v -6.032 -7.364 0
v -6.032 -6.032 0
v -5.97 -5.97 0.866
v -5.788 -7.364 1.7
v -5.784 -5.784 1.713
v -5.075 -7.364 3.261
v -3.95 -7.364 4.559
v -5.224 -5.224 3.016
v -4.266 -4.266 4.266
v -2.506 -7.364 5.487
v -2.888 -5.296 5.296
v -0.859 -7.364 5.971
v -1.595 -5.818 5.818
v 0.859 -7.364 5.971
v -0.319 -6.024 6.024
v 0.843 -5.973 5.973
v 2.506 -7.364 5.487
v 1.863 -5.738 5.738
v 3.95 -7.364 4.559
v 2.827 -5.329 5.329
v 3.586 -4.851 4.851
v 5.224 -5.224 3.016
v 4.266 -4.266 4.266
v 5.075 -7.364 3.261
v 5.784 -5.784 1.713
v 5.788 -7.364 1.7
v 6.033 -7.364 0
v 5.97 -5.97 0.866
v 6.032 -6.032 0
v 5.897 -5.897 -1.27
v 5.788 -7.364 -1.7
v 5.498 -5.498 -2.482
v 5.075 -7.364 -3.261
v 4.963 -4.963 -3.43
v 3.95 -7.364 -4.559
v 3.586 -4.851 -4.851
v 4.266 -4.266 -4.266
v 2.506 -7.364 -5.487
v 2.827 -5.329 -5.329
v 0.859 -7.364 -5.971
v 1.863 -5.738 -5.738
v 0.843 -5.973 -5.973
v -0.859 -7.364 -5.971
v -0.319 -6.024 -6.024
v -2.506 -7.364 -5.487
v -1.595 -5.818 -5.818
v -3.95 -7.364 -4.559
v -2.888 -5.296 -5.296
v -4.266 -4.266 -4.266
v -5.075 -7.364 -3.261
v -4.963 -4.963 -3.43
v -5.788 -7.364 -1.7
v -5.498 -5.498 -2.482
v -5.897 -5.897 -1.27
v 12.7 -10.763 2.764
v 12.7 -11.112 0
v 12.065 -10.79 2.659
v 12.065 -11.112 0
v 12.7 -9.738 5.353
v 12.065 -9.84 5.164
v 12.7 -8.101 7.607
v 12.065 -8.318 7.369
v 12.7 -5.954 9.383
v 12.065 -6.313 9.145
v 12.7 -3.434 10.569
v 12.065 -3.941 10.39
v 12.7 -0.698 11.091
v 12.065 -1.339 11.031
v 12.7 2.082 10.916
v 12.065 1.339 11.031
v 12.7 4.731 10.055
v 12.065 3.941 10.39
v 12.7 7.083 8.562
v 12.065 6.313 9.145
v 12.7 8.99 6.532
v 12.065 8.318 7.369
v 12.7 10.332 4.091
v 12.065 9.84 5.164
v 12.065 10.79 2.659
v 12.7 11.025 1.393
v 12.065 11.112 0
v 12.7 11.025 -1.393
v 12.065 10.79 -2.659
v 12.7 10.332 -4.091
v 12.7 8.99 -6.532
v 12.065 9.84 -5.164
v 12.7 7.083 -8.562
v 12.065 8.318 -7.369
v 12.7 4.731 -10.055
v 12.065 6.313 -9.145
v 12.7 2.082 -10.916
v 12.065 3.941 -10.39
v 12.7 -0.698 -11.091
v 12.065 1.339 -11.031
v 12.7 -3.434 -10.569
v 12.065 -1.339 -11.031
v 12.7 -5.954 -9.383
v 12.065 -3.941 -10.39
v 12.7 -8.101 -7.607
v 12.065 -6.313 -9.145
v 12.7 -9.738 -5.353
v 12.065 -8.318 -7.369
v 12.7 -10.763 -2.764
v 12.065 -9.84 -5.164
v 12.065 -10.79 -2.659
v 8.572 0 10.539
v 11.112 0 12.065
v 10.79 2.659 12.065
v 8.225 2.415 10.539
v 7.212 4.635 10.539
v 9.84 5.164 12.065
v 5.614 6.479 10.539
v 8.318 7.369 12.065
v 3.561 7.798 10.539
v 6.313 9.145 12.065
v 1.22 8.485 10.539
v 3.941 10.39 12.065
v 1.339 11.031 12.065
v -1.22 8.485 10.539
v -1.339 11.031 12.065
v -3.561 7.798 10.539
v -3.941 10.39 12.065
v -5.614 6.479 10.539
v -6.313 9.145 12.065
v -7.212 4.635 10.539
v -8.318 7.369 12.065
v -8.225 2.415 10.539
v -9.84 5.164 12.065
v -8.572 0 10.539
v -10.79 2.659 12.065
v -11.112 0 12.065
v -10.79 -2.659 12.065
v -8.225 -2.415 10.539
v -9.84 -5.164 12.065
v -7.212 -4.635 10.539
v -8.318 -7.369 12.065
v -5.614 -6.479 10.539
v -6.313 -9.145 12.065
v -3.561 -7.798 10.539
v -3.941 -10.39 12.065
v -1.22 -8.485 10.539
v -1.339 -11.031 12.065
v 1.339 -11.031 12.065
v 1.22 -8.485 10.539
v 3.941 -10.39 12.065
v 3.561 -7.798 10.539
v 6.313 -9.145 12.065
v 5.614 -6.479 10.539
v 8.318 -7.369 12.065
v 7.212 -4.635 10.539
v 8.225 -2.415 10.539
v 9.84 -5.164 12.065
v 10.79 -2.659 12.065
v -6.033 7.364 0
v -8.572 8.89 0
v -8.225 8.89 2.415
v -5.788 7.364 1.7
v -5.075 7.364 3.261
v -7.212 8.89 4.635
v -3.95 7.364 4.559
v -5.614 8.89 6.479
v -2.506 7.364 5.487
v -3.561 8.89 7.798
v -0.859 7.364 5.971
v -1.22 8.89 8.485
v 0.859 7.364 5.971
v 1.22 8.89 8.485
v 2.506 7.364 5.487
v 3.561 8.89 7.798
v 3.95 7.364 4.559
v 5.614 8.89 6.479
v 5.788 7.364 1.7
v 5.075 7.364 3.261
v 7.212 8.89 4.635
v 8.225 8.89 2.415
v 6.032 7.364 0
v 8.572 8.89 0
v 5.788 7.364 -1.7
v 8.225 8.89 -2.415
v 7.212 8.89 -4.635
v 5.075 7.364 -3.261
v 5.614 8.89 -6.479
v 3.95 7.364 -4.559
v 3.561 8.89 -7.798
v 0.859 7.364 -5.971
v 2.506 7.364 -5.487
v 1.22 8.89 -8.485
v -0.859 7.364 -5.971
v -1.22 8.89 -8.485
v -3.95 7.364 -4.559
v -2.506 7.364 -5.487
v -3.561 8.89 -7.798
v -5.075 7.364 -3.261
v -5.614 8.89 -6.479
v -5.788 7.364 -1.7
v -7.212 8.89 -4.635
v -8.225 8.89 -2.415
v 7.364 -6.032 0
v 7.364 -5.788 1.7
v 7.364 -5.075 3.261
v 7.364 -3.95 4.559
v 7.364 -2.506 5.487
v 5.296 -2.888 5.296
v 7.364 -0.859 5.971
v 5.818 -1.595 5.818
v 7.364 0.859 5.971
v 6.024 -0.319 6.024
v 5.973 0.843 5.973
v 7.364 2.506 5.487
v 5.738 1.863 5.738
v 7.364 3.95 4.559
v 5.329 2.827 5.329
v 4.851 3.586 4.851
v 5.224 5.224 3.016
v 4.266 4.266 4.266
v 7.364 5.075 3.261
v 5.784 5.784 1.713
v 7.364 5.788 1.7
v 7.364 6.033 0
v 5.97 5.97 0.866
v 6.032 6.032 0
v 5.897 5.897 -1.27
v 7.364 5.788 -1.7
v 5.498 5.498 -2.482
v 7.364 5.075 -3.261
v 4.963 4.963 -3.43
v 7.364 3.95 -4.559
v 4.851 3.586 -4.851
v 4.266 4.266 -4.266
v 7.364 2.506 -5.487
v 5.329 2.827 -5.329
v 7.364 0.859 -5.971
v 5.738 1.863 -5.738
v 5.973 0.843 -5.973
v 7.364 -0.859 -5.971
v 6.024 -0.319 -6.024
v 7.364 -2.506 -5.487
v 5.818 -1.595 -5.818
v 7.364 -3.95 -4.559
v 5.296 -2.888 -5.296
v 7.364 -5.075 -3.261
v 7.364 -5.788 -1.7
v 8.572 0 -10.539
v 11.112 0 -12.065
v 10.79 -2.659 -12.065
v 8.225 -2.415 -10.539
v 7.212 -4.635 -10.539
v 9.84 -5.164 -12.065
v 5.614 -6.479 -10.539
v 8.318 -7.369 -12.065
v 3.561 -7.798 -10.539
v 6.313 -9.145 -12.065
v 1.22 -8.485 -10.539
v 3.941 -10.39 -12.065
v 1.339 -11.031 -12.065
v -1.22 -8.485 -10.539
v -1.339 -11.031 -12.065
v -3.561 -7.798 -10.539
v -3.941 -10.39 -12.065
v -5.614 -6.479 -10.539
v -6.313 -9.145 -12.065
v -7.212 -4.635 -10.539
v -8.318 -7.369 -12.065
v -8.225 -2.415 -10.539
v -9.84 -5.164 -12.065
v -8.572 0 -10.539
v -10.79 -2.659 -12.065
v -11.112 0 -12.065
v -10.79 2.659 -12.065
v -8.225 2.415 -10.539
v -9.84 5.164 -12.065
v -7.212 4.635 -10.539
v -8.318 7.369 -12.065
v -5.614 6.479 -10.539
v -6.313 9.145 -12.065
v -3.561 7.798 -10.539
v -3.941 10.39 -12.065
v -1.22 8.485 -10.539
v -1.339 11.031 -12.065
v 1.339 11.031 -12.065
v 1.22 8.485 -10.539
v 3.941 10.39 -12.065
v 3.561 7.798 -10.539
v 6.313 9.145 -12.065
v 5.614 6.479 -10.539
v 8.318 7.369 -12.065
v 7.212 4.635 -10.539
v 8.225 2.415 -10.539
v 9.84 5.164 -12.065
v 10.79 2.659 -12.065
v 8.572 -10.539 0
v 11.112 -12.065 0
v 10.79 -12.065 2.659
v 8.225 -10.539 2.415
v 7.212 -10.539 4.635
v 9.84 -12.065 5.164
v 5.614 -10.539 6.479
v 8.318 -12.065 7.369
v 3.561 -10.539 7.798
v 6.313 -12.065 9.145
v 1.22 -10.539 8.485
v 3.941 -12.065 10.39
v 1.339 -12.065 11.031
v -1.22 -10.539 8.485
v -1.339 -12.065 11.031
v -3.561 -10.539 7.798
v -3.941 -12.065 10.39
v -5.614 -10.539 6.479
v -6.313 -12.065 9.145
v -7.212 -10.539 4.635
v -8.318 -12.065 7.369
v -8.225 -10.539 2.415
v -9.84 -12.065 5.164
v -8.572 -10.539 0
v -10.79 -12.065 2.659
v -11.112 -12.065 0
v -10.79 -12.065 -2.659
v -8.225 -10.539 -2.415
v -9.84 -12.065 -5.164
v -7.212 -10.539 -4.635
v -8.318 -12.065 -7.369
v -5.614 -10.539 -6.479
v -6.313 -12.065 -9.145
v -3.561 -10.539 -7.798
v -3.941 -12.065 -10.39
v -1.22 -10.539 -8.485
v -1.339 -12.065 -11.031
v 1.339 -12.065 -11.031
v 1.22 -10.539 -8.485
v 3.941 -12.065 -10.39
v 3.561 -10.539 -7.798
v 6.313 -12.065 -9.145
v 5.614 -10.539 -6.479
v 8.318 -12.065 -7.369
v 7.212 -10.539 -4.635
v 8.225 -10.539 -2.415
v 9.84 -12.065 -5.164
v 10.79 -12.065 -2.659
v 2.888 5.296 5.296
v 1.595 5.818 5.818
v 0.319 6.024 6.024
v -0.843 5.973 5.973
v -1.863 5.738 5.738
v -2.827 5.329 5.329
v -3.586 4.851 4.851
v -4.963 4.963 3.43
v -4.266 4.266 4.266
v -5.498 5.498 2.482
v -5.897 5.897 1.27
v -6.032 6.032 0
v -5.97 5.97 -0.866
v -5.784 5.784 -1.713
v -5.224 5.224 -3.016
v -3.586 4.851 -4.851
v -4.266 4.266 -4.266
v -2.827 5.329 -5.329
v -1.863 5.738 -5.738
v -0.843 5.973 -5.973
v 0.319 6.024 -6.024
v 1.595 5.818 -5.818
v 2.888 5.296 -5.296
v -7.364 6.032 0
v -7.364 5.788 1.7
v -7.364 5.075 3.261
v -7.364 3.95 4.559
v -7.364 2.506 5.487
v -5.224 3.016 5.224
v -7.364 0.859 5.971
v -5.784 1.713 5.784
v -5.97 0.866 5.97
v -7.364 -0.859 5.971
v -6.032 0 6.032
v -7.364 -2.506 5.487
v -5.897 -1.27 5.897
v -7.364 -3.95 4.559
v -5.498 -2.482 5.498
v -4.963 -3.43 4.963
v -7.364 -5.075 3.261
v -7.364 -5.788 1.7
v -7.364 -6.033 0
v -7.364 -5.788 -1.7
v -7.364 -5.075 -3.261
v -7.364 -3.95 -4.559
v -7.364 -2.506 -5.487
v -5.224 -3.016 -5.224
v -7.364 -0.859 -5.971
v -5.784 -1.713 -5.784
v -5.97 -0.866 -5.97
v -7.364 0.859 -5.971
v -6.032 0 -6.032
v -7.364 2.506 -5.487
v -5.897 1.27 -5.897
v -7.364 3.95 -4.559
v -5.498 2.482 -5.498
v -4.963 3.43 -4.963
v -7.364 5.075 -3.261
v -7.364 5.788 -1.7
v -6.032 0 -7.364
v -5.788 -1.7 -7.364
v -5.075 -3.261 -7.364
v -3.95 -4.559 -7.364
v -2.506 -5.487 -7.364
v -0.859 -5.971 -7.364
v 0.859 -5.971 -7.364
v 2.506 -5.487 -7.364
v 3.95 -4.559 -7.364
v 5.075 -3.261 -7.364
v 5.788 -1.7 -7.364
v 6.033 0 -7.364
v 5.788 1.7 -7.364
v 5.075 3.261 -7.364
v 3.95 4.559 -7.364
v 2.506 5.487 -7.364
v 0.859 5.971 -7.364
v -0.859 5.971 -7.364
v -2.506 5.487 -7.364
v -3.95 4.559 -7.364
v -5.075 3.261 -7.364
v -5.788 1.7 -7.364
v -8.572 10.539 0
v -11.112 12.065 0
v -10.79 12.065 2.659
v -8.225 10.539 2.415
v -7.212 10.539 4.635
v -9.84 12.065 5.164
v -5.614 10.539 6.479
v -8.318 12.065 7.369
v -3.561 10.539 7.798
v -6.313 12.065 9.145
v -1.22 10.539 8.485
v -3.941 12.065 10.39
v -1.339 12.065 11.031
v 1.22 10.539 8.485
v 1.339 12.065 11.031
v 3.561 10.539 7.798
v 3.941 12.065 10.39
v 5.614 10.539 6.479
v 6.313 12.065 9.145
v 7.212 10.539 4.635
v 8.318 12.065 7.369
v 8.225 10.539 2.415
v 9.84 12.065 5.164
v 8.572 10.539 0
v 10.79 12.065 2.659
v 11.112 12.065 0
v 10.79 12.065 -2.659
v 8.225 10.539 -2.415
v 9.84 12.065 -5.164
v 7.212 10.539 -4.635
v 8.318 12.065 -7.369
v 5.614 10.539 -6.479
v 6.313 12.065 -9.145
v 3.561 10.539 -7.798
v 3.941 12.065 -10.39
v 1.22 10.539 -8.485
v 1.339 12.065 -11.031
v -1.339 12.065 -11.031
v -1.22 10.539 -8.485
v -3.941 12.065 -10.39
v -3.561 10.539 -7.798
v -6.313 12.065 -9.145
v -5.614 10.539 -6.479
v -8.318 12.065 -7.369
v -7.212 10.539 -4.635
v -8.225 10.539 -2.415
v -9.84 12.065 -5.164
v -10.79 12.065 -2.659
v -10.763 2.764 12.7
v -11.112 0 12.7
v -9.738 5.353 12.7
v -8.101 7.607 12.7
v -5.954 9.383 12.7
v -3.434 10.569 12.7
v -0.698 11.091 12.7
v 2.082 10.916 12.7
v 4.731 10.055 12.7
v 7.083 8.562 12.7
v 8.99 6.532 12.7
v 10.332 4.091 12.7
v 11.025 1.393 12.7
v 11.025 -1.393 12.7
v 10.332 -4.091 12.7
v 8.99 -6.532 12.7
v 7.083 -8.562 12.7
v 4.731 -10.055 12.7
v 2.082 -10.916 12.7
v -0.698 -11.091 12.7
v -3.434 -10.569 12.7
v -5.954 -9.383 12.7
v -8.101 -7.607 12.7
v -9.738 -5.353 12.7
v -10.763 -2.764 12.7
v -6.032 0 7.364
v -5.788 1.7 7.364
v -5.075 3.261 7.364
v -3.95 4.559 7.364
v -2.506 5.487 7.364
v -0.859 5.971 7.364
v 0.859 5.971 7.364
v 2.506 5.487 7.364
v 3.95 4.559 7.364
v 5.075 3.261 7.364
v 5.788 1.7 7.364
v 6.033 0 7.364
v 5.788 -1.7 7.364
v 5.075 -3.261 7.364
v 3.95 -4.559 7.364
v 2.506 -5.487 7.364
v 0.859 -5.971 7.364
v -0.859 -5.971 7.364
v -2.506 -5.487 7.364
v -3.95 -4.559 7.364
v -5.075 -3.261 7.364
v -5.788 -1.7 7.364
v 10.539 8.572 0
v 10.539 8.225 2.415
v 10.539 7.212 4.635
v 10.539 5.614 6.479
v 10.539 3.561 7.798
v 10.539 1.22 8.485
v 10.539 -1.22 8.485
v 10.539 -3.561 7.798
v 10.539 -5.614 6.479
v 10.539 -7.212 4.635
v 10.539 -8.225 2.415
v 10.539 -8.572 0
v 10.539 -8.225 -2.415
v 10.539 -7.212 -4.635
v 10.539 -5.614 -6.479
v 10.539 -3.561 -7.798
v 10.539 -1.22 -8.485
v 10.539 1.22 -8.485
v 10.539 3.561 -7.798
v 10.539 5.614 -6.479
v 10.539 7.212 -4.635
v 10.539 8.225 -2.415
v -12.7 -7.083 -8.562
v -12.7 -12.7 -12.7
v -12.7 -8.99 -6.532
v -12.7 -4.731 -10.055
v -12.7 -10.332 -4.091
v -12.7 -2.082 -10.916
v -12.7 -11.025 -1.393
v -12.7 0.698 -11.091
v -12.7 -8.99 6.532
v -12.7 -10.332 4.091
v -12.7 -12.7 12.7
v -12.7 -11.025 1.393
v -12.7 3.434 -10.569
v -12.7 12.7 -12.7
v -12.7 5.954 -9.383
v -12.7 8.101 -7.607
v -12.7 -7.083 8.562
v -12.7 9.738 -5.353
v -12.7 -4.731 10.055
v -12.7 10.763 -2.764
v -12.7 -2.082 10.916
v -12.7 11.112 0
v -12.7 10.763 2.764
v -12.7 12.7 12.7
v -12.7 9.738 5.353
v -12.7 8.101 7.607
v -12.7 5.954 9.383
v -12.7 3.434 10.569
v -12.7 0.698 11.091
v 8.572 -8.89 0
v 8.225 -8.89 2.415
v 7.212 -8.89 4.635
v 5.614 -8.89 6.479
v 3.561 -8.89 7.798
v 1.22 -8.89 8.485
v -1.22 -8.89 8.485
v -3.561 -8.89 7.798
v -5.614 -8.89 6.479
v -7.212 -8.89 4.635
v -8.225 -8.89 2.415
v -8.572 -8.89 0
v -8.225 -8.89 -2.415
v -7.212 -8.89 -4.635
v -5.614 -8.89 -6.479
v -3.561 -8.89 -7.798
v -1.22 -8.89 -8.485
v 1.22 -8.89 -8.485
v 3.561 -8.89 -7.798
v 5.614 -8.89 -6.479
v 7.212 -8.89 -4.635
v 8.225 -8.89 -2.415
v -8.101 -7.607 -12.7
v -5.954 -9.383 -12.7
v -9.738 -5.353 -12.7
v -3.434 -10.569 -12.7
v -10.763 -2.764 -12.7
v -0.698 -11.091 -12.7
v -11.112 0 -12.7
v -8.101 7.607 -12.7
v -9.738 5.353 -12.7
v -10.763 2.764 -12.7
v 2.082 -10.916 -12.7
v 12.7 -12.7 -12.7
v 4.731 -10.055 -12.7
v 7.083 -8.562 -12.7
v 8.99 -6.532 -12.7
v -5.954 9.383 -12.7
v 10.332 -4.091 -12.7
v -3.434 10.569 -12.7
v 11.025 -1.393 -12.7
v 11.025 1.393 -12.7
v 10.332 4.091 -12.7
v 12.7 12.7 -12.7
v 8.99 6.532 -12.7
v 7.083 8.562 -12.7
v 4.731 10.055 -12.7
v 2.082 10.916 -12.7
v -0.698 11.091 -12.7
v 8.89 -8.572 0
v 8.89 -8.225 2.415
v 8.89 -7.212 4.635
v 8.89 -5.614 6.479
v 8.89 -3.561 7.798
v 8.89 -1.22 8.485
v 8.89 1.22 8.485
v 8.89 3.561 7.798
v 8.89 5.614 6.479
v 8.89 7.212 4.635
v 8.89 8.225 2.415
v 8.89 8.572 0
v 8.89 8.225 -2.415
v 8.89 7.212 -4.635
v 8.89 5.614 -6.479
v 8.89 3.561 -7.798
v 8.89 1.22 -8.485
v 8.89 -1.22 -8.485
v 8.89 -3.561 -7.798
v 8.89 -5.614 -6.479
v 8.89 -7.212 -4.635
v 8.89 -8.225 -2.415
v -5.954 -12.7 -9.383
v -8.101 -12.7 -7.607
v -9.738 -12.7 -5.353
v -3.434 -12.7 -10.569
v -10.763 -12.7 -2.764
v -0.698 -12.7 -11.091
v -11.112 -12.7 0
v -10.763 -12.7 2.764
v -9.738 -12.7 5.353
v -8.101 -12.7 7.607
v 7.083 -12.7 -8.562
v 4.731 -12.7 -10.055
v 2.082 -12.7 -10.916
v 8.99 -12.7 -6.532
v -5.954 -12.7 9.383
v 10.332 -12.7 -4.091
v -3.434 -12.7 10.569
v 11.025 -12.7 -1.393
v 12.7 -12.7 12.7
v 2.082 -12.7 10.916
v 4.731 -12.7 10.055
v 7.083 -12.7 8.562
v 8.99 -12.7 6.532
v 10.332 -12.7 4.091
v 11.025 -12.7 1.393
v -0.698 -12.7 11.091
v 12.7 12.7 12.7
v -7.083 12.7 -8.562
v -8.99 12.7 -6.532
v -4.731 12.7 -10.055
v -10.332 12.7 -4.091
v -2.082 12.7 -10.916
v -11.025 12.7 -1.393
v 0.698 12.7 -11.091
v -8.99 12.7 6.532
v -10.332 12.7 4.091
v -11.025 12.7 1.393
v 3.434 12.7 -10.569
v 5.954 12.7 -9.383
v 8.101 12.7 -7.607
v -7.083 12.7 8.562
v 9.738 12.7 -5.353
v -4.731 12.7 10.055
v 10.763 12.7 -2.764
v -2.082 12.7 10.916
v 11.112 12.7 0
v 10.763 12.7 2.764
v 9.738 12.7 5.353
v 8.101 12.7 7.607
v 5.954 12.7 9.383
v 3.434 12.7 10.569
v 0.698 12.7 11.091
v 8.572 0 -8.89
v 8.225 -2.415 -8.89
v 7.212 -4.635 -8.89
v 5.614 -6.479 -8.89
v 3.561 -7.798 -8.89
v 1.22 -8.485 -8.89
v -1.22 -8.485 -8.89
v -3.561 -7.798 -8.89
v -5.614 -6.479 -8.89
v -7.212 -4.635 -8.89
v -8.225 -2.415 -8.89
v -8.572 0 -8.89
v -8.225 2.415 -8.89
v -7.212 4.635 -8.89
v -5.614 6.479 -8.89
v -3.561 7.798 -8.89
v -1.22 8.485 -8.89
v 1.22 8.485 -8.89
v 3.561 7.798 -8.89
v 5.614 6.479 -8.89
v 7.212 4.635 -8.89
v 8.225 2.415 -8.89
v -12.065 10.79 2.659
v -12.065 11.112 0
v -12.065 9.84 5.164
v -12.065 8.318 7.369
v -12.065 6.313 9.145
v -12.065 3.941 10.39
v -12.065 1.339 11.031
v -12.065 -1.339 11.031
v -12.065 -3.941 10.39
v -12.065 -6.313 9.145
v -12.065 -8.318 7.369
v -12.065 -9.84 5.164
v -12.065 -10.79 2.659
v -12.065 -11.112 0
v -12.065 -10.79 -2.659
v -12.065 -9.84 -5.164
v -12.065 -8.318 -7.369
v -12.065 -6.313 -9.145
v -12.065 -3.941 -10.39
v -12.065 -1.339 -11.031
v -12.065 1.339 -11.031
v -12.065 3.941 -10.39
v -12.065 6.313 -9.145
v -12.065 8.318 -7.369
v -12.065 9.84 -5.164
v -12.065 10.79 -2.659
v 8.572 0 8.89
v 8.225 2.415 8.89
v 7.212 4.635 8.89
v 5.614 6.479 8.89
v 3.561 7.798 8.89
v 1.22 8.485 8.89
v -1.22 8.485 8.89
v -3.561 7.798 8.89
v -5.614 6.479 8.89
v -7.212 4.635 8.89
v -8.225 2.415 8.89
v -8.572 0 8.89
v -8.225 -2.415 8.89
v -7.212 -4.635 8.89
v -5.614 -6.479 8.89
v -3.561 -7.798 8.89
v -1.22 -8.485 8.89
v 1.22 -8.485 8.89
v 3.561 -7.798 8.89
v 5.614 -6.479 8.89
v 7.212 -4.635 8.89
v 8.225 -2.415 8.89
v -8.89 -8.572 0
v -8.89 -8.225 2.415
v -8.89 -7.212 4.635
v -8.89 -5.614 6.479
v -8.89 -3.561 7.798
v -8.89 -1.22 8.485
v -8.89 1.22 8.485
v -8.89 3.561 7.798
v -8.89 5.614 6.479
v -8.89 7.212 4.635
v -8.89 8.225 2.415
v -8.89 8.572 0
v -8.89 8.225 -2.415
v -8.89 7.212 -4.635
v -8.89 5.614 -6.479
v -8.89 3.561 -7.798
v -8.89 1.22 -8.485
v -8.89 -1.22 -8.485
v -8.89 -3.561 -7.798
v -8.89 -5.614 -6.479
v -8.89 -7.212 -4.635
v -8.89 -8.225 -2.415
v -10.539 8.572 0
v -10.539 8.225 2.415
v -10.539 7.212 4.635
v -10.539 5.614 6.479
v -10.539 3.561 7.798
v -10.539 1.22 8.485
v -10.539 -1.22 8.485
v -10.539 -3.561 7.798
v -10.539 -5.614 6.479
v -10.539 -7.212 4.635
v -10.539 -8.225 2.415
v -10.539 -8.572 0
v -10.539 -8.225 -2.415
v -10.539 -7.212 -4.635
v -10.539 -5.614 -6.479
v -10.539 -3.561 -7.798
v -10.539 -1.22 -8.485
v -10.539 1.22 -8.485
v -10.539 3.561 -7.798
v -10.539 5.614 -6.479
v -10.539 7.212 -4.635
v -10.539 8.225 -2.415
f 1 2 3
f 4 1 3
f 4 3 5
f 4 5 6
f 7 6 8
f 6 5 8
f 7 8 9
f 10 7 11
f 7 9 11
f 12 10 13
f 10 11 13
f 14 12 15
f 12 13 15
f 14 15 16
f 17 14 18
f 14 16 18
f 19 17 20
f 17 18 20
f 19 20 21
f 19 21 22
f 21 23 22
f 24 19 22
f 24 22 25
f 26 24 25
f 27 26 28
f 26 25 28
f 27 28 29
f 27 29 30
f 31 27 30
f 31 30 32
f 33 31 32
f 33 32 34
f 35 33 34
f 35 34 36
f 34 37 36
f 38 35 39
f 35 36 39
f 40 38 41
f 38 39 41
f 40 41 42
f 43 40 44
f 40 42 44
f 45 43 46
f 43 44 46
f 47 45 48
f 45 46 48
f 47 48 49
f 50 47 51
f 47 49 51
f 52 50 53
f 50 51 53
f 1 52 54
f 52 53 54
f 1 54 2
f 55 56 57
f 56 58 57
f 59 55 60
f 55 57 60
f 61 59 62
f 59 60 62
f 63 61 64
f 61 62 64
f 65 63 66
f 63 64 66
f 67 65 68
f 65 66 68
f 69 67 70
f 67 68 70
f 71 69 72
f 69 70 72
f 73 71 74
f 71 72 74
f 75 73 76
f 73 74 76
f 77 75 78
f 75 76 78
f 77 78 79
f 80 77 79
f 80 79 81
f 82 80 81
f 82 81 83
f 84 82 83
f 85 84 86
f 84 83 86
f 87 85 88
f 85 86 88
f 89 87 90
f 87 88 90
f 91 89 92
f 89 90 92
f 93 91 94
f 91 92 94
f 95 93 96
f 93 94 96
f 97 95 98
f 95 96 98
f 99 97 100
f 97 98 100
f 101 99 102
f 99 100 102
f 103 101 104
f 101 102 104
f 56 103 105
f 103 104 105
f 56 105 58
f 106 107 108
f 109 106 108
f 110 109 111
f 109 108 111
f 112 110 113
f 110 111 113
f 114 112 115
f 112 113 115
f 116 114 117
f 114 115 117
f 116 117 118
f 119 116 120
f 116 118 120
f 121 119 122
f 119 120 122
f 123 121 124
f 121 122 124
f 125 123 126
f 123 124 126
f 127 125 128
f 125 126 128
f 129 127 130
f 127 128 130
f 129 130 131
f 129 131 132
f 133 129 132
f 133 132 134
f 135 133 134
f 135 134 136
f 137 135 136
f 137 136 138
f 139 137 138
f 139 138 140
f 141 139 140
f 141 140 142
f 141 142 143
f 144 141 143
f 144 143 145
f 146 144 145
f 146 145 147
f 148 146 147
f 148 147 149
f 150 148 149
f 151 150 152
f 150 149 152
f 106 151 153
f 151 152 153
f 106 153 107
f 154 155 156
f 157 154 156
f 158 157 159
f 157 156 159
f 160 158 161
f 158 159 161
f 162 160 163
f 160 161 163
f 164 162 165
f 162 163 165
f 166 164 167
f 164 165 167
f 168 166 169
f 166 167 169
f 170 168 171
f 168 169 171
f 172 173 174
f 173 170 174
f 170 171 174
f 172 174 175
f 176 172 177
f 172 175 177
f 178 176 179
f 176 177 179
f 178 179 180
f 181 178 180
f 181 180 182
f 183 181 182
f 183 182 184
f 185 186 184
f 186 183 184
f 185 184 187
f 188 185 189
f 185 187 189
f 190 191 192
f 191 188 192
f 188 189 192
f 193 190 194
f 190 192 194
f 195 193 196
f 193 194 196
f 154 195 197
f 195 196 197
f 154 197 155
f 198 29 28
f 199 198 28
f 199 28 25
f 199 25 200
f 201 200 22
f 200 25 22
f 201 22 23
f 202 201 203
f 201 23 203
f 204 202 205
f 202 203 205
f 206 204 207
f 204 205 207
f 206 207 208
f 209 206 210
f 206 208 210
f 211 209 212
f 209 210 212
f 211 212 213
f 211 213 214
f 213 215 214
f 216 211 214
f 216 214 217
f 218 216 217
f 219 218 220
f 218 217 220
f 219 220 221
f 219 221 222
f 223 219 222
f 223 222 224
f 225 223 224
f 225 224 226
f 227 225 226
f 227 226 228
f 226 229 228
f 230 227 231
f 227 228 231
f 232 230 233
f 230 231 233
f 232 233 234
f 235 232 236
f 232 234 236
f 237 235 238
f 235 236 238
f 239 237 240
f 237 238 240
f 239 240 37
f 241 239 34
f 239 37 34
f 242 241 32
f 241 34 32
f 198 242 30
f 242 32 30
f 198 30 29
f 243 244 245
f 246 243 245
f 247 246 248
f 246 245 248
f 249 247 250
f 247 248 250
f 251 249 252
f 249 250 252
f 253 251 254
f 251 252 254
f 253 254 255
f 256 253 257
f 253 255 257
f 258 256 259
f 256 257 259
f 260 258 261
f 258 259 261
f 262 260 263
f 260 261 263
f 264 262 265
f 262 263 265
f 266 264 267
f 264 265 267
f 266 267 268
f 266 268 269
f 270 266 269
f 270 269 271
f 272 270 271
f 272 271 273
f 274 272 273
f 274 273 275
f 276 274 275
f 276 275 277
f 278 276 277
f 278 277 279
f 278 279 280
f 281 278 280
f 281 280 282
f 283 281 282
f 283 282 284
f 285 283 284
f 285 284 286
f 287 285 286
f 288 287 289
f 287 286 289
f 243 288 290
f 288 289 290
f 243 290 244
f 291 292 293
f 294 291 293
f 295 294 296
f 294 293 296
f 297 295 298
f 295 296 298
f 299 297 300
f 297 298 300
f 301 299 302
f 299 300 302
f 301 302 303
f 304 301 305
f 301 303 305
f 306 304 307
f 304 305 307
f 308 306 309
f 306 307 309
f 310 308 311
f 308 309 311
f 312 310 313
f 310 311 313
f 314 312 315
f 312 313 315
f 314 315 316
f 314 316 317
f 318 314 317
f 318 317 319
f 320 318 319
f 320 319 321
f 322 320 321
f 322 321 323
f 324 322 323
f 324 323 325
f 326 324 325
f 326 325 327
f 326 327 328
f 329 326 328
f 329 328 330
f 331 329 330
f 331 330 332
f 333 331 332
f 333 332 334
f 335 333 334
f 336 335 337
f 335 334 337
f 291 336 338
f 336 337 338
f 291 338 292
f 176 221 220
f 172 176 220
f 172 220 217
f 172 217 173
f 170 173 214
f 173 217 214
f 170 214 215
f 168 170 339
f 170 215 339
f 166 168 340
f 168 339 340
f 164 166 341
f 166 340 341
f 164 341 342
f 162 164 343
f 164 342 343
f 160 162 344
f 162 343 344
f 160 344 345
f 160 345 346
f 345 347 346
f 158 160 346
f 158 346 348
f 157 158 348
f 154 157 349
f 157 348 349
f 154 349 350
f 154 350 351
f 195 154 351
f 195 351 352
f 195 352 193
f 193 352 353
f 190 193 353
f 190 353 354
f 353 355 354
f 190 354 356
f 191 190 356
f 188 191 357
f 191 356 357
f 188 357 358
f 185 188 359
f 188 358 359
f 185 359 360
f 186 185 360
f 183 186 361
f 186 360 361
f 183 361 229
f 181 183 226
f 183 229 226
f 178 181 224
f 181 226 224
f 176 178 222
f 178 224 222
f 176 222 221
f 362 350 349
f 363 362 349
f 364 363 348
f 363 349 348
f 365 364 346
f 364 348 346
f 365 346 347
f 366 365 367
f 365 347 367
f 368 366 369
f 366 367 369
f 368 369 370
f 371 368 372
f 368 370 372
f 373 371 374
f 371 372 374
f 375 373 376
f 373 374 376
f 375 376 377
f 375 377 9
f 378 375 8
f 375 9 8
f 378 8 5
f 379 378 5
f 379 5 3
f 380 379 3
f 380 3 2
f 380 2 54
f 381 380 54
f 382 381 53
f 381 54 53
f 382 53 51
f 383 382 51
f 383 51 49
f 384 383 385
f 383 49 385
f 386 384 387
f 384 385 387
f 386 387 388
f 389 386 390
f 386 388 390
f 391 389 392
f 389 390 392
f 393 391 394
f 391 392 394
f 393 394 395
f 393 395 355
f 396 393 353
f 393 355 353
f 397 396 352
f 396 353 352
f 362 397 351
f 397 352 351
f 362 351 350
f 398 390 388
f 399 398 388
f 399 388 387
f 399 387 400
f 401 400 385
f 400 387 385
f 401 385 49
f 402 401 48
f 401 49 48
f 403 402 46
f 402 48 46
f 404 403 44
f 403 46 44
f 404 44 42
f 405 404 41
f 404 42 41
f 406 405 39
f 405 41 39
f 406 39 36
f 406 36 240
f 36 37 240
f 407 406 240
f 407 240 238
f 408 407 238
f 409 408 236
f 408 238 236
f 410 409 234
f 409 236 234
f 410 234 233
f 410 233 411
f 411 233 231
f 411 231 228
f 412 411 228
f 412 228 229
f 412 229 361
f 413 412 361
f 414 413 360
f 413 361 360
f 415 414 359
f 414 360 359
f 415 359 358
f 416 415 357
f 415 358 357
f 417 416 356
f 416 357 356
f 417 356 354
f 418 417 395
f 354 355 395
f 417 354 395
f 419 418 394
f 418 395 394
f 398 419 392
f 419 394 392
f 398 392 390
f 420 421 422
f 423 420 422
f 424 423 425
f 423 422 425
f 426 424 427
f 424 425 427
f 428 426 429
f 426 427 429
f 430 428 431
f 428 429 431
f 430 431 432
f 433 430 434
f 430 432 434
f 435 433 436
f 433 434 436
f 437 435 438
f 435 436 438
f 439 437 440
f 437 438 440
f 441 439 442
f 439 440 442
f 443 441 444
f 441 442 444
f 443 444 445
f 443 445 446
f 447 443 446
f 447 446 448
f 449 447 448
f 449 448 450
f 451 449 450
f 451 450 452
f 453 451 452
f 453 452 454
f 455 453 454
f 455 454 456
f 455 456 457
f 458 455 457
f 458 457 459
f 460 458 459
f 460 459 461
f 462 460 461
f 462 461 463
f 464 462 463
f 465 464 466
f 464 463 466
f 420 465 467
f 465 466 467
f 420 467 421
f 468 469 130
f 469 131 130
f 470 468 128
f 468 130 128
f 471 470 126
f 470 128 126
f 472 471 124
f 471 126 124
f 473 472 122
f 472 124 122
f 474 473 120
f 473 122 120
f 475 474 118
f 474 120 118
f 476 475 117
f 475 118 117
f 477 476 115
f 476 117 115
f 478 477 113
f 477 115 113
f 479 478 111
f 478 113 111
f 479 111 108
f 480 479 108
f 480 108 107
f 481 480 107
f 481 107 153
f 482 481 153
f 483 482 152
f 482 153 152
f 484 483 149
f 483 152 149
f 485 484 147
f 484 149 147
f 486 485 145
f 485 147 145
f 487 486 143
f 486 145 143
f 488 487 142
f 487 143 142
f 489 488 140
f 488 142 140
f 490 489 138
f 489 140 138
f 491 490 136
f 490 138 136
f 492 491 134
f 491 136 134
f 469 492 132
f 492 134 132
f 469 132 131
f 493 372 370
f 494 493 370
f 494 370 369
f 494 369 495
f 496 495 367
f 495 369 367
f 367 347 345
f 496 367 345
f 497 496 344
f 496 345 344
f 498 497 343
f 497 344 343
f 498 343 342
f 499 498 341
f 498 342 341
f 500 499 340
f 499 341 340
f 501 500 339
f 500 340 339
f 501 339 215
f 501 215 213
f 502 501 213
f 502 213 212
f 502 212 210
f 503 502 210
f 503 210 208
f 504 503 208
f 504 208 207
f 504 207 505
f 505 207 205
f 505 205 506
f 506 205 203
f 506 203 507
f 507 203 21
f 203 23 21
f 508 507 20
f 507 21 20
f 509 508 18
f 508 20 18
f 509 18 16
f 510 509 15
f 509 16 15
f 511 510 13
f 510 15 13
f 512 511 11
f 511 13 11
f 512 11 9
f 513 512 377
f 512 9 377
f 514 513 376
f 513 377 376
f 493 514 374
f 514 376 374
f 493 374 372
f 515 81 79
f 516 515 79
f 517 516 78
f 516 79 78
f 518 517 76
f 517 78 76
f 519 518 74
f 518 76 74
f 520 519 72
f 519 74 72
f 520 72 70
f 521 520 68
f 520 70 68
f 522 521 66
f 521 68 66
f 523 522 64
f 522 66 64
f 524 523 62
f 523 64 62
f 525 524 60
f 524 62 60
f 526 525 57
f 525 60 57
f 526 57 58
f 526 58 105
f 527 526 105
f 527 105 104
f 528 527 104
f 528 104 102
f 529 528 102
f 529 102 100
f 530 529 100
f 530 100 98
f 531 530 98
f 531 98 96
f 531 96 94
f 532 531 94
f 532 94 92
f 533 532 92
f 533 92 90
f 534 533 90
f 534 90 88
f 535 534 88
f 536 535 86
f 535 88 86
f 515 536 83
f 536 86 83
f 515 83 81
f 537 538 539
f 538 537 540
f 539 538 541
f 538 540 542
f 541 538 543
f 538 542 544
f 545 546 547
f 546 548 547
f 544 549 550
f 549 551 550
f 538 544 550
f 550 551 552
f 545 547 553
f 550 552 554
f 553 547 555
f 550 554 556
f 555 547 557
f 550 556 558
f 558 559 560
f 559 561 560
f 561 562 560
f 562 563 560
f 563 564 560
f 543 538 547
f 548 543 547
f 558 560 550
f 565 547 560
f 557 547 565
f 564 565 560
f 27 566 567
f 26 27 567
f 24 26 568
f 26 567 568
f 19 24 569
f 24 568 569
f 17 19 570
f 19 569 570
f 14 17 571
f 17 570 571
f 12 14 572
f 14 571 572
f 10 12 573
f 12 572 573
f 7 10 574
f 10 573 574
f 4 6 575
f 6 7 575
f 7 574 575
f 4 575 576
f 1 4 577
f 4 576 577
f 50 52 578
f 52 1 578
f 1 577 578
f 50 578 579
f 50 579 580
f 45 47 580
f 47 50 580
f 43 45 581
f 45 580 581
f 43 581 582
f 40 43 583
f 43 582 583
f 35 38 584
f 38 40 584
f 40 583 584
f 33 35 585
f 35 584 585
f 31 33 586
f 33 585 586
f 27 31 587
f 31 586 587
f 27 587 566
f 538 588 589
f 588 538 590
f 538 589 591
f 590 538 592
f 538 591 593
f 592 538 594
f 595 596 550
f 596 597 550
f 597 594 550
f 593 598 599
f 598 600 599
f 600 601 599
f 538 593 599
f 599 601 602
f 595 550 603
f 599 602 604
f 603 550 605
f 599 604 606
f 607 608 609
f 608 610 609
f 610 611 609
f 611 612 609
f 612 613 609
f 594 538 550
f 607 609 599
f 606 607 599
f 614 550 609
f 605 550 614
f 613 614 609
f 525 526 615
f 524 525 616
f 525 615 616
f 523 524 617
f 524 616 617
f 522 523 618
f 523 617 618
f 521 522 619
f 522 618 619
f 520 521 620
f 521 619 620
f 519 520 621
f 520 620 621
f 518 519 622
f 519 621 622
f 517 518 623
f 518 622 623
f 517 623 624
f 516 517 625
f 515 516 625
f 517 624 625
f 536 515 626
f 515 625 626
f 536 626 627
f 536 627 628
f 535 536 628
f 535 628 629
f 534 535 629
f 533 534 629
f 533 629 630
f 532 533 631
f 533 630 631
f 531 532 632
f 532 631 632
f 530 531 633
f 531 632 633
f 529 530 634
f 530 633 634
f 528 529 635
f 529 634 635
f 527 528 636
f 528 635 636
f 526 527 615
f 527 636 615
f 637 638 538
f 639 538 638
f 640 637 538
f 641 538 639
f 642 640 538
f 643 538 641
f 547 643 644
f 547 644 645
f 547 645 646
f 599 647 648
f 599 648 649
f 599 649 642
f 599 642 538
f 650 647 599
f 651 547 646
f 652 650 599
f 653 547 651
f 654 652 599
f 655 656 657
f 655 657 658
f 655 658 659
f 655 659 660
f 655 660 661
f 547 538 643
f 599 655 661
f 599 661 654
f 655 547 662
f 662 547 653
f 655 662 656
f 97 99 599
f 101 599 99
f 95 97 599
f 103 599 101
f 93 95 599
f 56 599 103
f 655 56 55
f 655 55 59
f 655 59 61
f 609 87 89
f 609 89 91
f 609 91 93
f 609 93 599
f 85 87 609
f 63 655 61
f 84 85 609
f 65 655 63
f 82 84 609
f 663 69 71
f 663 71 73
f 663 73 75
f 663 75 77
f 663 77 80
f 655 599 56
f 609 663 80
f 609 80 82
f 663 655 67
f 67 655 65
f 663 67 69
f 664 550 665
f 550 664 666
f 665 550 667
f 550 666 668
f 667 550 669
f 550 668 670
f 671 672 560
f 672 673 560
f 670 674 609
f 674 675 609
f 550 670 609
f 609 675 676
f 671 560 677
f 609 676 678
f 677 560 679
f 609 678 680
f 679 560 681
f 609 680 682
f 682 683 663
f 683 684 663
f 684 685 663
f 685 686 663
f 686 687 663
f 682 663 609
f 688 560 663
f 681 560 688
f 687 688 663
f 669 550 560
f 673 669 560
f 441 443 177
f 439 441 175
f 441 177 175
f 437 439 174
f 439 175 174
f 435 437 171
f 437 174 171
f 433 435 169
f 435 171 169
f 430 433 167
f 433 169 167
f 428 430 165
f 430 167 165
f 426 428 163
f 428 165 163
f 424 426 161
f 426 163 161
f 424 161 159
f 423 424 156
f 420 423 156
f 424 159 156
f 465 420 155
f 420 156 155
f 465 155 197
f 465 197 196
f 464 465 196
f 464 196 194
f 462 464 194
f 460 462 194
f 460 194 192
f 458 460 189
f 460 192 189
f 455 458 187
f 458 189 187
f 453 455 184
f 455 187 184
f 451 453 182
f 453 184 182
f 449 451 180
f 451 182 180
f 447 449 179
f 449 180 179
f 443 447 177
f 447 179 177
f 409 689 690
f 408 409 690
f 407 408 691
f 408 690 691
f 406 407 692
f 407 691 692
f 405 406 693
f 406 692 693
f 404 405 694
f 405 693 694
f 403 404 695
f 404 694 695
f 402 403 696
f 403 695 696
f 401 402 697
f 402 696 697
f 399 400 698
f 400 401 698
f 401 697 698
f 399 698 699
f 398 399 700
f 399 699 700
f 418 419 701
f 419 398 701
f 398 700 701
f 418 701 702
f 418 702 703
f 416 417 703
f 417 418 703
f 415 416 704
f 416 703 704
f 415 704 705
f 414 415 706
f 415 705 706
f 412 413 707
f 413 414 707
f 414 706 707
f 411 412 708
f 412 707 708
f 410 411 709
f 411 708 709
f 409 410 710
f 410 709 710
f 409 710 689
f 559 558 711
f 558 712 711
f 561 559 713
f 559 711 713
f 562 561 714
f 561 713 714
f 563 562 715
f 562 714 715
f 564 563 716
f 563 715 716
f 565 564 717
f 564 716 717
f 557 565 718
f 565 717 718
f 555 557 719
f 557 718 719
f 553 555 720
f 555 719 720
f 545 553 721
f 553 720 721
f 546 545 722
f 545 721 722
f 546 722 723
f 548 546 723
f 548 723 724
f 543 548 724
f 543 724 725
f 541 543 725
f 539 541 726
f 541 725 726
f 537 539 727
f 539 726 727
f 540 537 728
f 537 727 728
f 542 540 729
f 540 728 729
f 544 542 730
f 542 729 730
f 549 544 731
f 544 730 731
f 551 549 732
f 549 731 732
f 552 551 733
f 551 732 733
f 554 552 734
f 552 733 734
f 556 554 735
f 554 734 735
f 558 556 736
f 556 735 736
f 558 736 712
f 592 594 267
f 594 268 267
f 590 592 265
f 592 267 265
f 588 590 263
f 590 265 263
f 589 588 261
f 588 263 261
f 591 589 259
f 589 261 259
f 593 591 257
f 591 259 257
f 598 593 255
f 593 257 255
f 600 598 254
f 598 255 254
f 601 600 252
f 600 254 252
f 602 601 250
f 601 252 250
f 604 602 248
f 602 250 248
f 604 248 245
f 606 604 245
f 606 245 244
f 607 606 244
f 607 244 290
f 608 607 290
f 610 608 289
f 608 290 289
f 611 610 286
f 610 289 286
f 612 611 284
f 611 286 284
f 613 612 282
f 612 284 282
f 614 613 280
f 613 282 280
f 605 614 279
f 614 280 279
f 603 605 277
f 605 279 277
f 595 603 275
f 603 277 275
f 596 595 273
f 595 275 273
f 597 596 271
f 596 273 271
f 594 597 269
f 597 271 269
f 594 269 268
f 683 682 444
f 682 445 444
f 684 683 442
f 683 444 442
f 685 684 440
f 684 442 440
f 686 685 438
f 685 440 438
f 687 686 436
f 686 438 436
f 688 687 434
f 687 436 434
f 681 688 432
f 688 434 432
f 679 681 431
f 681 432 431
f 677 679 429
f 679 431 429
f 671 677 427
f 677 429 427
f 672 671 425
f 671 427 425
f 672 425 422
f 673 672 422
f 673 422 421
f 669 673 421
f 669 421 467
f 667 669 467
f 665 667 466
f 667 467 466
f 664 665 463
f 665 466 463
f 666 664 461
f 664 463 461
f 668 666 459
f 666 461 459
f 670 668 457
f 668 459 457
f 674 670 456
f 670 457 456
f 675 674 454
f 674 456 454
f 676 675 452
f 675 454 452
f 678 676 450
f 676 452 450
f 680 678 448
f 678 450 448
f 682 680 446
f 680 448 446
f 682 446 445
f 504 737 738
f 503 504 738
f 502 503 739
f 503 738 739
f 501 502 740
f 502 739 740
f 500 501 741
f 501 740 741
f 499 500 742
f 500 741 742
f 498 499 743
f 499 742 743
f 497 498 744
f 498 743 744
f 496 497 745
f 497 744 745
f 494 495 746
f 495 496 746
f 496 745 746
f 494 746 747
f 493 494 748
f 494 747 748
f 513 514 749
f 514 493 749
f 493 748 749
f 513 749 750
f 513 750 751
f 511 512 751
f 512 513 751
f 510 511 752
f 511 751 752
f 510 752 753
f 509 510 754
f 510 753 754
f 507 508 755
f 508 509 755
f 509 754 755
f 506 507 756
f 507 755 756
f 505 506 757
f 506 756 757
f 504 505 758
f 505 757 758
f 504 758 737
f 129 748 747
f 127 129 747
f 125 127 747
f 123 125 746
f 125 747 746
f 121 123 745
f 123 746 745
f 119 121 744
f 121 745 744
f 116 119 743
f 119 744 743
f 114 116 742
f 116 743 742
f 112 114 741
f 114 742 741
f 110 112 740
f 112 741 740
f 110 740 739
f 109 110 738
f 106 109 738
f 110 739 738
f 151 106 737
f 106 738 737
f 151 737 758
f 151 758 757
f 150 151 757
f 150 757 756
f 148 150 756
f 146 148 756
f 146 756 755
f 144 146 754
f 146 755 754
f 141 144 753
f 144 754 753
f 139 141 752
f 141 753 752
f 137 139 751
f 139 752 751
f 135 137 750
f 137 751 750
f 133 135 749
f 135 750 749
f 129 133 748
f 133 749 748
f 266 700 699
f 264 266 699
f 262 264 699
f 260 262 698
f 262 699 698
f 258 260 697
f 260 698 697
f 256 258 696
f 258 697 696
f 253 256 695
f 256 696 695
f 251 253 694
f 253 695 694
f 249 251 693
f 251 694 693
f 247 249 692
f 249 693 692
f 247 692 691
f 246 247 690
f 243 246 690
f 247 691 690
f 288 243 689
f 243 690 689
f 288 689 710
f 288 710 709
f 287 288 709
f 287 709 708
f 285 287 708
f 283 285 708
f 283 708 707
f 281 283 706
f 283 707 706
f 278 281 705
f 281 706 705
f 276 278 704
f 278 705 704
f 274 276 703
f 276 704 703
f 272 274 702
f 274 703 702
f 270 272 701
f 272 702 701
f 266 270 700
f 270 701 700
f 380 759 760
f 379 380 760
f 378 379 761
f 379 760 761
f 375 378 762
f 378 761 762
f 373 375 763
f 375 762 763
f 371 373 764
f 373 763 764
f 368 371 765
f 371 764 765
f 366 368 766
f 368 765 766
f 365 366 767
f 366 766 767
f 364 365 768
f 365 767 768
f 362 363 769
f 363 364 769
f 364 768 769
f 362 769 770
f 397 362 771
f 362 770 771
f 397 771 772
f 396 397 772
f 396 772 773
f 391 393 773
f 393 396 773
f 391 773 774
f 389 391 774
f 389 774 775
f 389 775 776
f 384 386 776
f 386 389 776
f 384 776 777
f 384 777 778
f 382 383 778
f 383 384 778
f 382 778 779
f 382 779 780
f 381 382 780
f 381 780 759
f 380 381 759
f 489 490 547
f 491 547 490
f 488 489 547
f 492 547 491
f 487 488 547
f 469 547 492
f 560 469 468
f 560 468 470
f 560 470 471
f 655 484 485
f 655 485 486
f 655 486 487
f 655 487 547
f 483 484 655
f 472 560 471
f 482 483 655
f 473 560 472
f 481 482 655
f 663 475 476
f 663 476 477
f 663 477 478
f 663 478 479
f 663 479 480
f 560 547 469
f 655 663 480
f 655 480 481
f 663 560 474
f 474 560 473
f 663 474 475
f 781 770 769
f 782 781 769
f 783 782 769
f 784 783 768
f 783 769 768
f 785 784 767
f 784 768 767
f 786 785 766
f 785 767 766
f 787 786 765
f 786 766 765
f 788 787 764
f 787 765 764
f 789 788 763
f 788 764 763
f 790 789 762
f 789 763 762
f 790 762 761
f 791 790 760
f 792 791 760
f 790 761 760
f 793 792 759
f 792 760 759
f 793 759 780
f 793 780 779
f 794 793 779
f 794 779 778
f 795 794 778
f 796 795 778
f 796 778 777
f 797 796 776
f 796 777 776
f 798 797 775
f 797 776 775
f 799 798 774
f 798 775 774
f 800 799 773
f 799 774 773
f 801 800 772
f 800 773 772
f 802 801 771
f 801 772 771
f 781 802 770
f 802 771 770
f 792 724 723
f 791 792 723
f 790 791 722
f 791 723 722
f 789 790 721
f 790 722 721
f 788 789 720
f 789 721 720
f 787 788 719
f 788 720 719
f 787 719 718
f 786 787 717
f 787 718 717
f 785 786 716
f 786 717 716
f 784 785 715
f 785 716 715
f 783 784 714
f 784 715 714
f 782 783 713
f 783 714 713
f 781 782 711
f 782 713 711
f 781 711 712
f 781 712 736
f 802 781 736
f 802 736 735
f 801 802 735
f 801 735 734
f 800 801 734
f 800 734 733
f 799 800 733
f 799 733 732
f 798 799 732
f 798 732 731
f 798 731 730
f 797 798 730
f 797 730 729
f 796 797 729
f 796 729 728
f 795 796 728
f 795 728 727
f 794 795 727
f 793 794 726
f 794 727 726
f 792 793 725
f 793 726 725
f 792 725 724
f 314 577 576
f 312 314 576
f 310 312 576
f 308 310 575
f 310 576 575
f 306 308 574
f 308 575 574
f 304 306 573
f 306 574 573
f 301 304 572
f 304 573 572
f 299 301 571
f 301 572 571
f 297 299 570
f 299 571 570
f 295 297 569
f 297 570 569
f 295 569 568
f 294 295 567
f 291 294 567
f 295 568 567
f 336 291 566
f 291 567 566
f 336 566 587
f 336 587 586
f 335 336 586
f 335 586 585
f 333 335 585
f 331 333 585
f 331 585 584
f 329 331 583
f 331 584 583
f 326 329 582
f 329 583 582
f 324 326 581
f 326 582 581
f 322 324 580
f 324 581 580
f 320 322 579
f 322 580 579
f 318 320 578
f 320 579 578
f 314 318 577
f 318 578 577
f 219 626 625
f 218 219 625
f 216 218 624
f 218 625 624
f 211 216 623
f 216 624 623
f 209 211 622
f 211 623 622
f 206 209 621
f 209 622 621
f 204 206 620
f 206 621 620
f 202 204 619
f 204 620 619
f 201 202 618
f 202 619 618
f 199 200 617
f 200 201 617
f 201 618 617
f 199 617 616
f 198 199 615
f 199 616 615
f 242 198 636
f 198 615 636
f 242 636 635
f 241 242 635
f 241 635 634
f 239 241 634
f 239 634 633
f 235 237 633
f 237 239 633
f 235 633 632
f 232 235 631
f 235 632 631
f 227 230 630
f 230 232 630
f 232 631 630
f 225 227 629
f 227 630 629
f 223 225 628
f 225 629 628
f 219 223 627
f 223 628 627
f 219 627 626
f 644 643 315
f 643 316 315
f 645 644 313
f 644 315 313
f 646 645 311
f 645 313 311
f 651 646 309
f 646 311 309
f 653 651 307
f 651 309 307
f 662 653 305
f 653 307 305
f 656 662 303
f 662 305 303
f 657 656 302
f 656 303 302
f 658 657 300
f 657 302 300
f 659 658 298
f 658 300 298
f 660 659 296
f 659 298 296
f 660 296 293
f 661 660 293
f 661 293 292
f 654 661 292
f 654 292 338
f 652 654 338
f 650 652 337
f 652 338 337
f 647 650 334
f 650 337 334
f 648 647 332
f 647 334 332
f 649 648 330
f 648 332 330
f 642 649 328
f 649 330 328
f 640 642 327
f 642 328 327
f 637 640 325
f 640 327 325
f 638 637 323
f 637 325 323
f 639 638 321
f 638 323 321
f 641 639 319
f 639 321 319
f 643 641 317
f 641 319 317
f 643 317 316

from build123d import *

# Parameters (mm, degrees)
F0_W             = 25.4
F0_H             = 25.4
F1_DEPTH         = 12.7
F3_D             = 3.175
F5_D             = 3.175
F7_D             = 3.175
F11_D            = 17.145
F11_DEPTH        = 3.81
F11_TIP          = 5.1508776566
F11_ON_F6_D      = 17.145
F11_ON_F6_DEPTH  = 3.81
F11_ON_F6_TIP    = 5.1508776566
F11_ON_F10_D     = 17.145
F11_ON_F10_DEPTH = 3.81
F11_ON_F10_TIP   = 5.1508776566
F11_ON_F4_D      = 17.145
F11_ON_F4_DEPTH  = 3.81
F11_ON_F4_TIP    = 5.1508776566
F11_ON_F9_D      = 17.145
F11_ON_F9_DEPTH  = 3.81
F11_ON_F9_TIP    = 5.1508776566
F11_ON_F2_D      = 17.145
F11_ON_F2_DEPTH  = 3.81
F11_ON_F2_TIP    = 5.1508776566
F12_D            = 22.225
F12_DEPTH        = 0.635
F12_TIP          = 6.6770636289
F12_ON_F2_D      = 22.225
F12_ON_F2_DEPTH  = 0.635
F12_ON_F2_TIP    = 6.6770636289
F12_ON_F10_D     = 22.225
F12_ON_F10_DEPTH = 0.635
F12_ON_F10_TIP   = 6.6770636289
F12_ON_F8_D      = 22.225
F12_ON_F8_DEPTH  = 0.635
F12_ON_F8_TIP    = 6.6770636289
F12_ON_F4_D      = 22.225
F12_ON_F4_DEPTH  = 0.635
F12_ON_F4_TIP    = 6.6770636289
F12_ON_F6_D      = 22.225
F12_ON_F6_DEPTH  = 0.635
F12_ON_F6_TIP    = 6.6770636289
F13_D            = 12.065
F13_DEPTH        = 3.81
F13_START        = 5.336186
F13_TIP          = 3.6246916843
F13_ON_F8_D      = 12.065
F13_ON_F8_DEPTH  = 3.81
F13_ON_F8_START  = 5.336186
F13_ON_F8_TIP    = 3.6246916843
F13_ON_F10_D     = 12.065
F13_ON_F10_DEPTH = 3.81
F13_ON_F10_START = 5.336186
F13_ON_F10_TIP   = 3.6246916843
F13_ON_F9_D      = 12.065
F13_ON_F9_DEPTH  = 3.81
F13_ON_F9_START  = 5.336186
F13_ON_F9_TIP    = 3.6246916843
F13_ON_F6_D      = 12.065
F13_ON_F6_DEPTH  = 3.81
F13_ON_F6_START  = 5.336186
F13_ON_F6_TIP    = 3.6246916843
F13_ON_F2_D      = 12.065
F13_ON_F2_DEPTH  = 3.81
F13_ON_F2_START  = 5.336186
F13_ON_F2_TIP    = 3.6246916843


with BuildPart() as f1:
    # F0 (on Top) → F1 (new body, symmetric)
    with BuildSketch(Plane.XY):
        Rectangle(F0_W, F0_H)
    extrude(amount=F1_DEPTH, both=True)

    # F3 (through all)
    with Locations(Plane.XY.offset(12.7)):
        with Locations((0, 0)):
            Hole(F3_D / 2)

    # F5 (through all)
    with Locations(Plane(origin=(-12.7, 0, 0), x_dir=(0, -1, 0), z_dir=(-1, 0, 0))):
        with Locations((0, 0)):
            Hole(F5_D / 2)

    # F7 (through all)
    with Locations(Plane(origin=(0, 12.7, 0), x_dir=(-1, 0, 0), z_dir=(0, 1, 0))):
        with Locations((0, 0)):
            Hole(F7_D / 2)

    # F11
    with Locations(Plane(origin=(0, 0, -12.7), x_dir=(1, 0, 0), z_dir=(0, 0, -1))):
        with Locations((0, 0)):
            Hole(F11_D / 2, depth=F11_DEPTH)
            with Locations((0, 0, -(F11_DEPTH + F11_TIP / 2))):  # 118° drill point
                Cone(0, F11_D / 2, F11_TIP, mode=Mode.SUBTRACT)

    # F11 on F6
    with Locations(Plane(origin=(0, 12.7, 0), x_dir=(-1, 0, 0), z_dir=(0, 1, 0))):
        with Locations((0, 0)):
            Hole(F11_ON_F6_D / 2, depth=F11_ON_F6_DEPTH)
            with Locations((0, 0, -(F11_ON_F6_DEPTH + F11_ON_F6_TIP / 2))):  # 118° drill point
                Cone(0, F11_ON_F6_D / 2, F11_ON_F6_TIP, mode=Mode.SUBTRACT)

    # F11 on F10
    with Locations(Plane.XZ.offset(12.7)):
        with Locations((0, 0)):
            Hole(F11_ON_F10_D / 2, depth=F11_ON_F10_DEPTH)
            with Locations((0, 0, -(F11_ON_F10_DEPTH + F11_ON_F10_TIP / 2))):  # 118° drill point
                Cone(0, F11_ON_F10_D / 2, F11_ON_F10_TIP, mode=Mode.SUBTRACT)

    # F11 on F4
    with Locations(Plane(origin=(-12.7, 0, 0), x_dir=(0, -1, 0), z_dir=(-1, 0, 0))):
        with Locations((0, 0)):
            Hole(F11_ON_F4_D / 2, depth=F11_ON_F4_DEPTH)
            with Locations((0, 0, -(F11_ON_F4_DEPTH + F11_ON_F4_TIP / 2))):  # 118° drill point
                Cone(0, F11_ON_F4_D / 2, F11_ON_F4_TIP, mode=Mode.SUBTRACT)

    # F11 on F9
    with Locations(Plane.YZ.offset(12.7)):
        with Locations((0, 0)):
            Hole(F11_ON_F9_D / 2, depth=F11_ON_F9_DEPTH)
            with Locations((0, 0, -(F11_ON_F9_DEPTH + F11_ON_F9_TIP / 2))):  # 118° drill point
                Cone(0, F11_ON_F9_D / 2, F11_ON_F9_TIP, mode=Mode.SUBTRACT)

    # F11 on F2
    with Locations(Plane.XY.offset(12.7)):
        with Locations((0, 0)):
            Hole(F11_ON_F2_D / 2, depth=F11_ON_F2_DEPTH)
            with Locations((0, 0, -(F11_ON_F2_DEPTH + F11_ON_F2_TIP / 2))):  # 118° drill point
                Cone(0, F11_ON_F2_D / 2, F11_ON_F2_TIP, mode=Mode.SUBTRACT)

    # F12
    with Locations(Plane.YZ.offset(12.7)):
        with Locations((0, 0)):
            Hole(F12_D / 2, depth=F12_DEPTH)
            with Locations((0, 0, -(F12_DEPTH + F12_TIP / 2))):  # 118° drill point
                Cone(0, F12_D / 2, F12_TIP, mode=Mode.SUBTRACT)

    # F12 on F2
    with Locations(Plane.XY.offset(12.7)):
        with Locations((0, 0)):
            Hole(F12_ON_F2_D / 2, depth=F12_ON_F2_DEPTH)
            with Locations((0, 0, -(F12_ON_F2_DEPTH + F12_ON_F2_TIP / 2))):  # 118° drill point
                Cone(0, F12_ON_F2_D / 2, F12_ON_F2_TIP, mode=Mode.SUBTRACT)

    # F12 on F10
    with Locations(Plane.XZ.offset(12.7)):
        with Locations((0, 0)):
            Hole(F12_ON_F10_D / 2, depth=F12_ON_F10_DEPTH)
            with Locations((0, 0, -(F12_ON_F10_DEPTH + F12_ON_F10_TIP / 2))):  # 118° drill point
                Cone(0, F12_ON_F10_D / 2, F12_ON_F10_TIP, mode=Mode.SUBTRACT)

    # F12 on F8
    with Locations(Plane(origin=(0, 0, -12.7), x_dir=(1, 0, 0), z_dir=(0, 0, -1))):
        with Locations((0, 0)):
            Hole(F12_ON_F8_D / 2, depth=F12_ON_F8_DEPTH)
            with Locations((0, 0, -(F12_ON_F8_DEPTH + F12_ON_F8_TIP / 2))):  # 118° drill point
                Cone(0, F12_ON_F8_D / 2, F12_ON_F8_TIP, mode=Mode.SUBTRACT)

    # F12 on F4
    with Locations(Plane(origin=(-12.7, 0, 0), x_dir=(0, -1, 0), z_dir=(-1, 0, 0))):
        with Locations((0, 0)):
            Hole(F12_ON_F4_D / 2, depth=F12_ON_F4_DEPTH)
            with Locations((0, 0, -(F12_ON_F4_DEPTH + F12_ON_F4_TIP / 2))):  # 118° drill point
                Cone(0, F12_ON_F4_D / 2, F12_ON_F4_TIP, mode=Mode.SUBTRACT)

    # F12 on F6
    with Locations(Plane(origin=(0, 12.7, 0), x_dir=(-1, 0, 0), z_dir=(0, 1, 0))):
        with Locations((0, 0)):
            Hole(F12_ON_F6_D / 2, depth=F12_ON_F6_DEPTH)
            with Locations((0, 0, -(F12_ON_F6_DEPTH + F12_ON_F6_TIP / 2))):  # 118° drill point
                Cone(0, F12_ON_F6_D / 2, F12_ON_F6_TIP, mode=Mode.SUBTRACT)

    # F13
    # its depths count from where the whole tool has entered the part; down to there all is cleared
    with Locations(Plane(origin=(-12.7, 0, 0), x_dir=(0, -1, 0), z_dir=(-1, 0, 0))):
        with Locations((0, 0)):
            Hole(F13_D / 2, depth=F13_START)
    with Locations(Plane(origin=(-12.7, 0, 0), x_dir=(0, -1, 0), z_dir=(-1, 0, 0)).offset(-F13_START)):
        with Locations((0, 0)):
            Hole(F13_D / 2, depth=F13_DEPTH)
            with Locations((0, 0, -(F13_DEPTH + F13_TIP / 2))):  # 118° drill point
                Cone(0, F13_D / 2, F13_TIP, mode=Mode.SUBTRACT)

    # F13 on F8
    # its depths count from where the whole tool has entered the part; down to there all is cleared
    with Locations(Plane(origin=(0, 0, -12.7), x_dir=(1, 0, 0), z_dir=(0, 0, -1))):
        with Locations((0, 0)):
            Hole(F13_ON_F8_D / 2, depth=F13_ON_F8_START)
    with Locations(Plane(origin=(0, 0, -12.7), x_dir=(1, 0, 0), z_dir=(0, 0, -1)).offset(-F13_ON_F8_START)):
        with Locations((0, 0)):
            Hole(F13_ON_F8_D / 2, depth=F13_ON_F8_DEPTH)
            with Locations((0, 0, -(F13_ON_F8_DEPTH + F13_ON_F8_TIP / 2))):  # 118° drill point
                Cone(0, F13_ON_F8_D / 2, F13_ON_F8_TIP, mode=Mode.SUBTRACT)

    # F13 on F10
    # its depths count from where the whole tool has entered the part; down to there all is cleared
    with Locations(Plane.XZ.offset(12.7)):
        with Locations((0, 0)):
            Hole(F13_ON_F10_D / 2, depth=F13_ON_F10_START)
    with Locations(Plane.XZ.offset(12.7).offset(-F13_ON_F10_START)):
        with Locations((0, 0)):
            Hole(F13_ON_F10_D / 2, depth=F13_ON_F10_DEPTH)
            with Locations((0, 0, -(F13_ON_F10_DEPTH + F13_ON_F10_TIP / 2))):  # 118° drill point
                Cone(0, F13_ON_F10_D / 2, F13_ON_F10_TIP, mode=Mode.SUBTRACT)

    # F13 on F9
    # its depths count from where the whole tool has entered the part; down to there all is cleared
    with Locations(Plane.YZ.offset(12.7)):
        with Locations((0, 0)):
            Hole(F13_ON_F9_D / 2, depth=F13_ON_F9_START)
    with Locations(Plane.YZ.offset(12.7).offset(-F13_ON_F9_START)):
        with Locations((0, 0)):
            Hole(F13_ON_F9_D / 2, depth=F13_ON_F9_DEPTH)
            with Locations((0, 0, -(F13_ON_F9_DEPTH + F13_ON_F9_TIP / 2))):  # 118° drill point
                Cone(0, F13_ON_F9_D / 2, F13_ON_F9_TIP, mode=Mode.SUBTRACT)

    # F13 on F6
    # its depths count from where the whole tool has entered the part; down to there all is cleared
    with Locations(Plane(origin=(0, 12.7, 0), x_dir=(-1, 0, 0), z_dir=(0, 1, 0))):
        with Locations((0, 0)):
            Hole(F13_ON_F6_D / 2, depth=F13_ON_F6_START)
    with Locations(Plane(origin=(0, 12.7, 0), x_dir=(-1, 0, 0), z_dir=(0, 1, 0)).offset(-F13_ON_F6_START)):
        with Locations((0, 0)):
            Hole(F13_ON_F6_D / 2, depth=F13_ON_F6_DEPTH)
            with Locations((0, 0, -(F13_ON_F6_DEPTH + F13_ON_F6_TIP / 2))):  # 118° drill point
                Cone(0, F13_ON_F6_D / 2, F13_ON_F6_TIP, mode=Mode.SUBTRACT)

    # F13 on F2
    # its depths count from where the whole tool has entered the part; down to there all is cleared
    with Locations(Plane.XY.offset(12.7)):
        with Locations((0, 0)):
            Hole(F13_ON_F2_D / 2, depth=F13_ON_F2_START)
    with Locations(Plane.XY.offset(12.7).offset(-F13_ON_F2_START)):
        with Locations((0, 0)):
            Hole(F13_ON_F2_D / 2, depth=F13_ON_F2_DEPTH)
            with Locations((0, 0, -(F13_ON_F2_DEPTH + F13_ON_F2_TIP / 2))):  # 118° drill point
                Cone(0, F13_ON_F2_D / 2, F13_ON_F2_TIP, mode=Mode.SUBTRACT)


solid = f1.part
